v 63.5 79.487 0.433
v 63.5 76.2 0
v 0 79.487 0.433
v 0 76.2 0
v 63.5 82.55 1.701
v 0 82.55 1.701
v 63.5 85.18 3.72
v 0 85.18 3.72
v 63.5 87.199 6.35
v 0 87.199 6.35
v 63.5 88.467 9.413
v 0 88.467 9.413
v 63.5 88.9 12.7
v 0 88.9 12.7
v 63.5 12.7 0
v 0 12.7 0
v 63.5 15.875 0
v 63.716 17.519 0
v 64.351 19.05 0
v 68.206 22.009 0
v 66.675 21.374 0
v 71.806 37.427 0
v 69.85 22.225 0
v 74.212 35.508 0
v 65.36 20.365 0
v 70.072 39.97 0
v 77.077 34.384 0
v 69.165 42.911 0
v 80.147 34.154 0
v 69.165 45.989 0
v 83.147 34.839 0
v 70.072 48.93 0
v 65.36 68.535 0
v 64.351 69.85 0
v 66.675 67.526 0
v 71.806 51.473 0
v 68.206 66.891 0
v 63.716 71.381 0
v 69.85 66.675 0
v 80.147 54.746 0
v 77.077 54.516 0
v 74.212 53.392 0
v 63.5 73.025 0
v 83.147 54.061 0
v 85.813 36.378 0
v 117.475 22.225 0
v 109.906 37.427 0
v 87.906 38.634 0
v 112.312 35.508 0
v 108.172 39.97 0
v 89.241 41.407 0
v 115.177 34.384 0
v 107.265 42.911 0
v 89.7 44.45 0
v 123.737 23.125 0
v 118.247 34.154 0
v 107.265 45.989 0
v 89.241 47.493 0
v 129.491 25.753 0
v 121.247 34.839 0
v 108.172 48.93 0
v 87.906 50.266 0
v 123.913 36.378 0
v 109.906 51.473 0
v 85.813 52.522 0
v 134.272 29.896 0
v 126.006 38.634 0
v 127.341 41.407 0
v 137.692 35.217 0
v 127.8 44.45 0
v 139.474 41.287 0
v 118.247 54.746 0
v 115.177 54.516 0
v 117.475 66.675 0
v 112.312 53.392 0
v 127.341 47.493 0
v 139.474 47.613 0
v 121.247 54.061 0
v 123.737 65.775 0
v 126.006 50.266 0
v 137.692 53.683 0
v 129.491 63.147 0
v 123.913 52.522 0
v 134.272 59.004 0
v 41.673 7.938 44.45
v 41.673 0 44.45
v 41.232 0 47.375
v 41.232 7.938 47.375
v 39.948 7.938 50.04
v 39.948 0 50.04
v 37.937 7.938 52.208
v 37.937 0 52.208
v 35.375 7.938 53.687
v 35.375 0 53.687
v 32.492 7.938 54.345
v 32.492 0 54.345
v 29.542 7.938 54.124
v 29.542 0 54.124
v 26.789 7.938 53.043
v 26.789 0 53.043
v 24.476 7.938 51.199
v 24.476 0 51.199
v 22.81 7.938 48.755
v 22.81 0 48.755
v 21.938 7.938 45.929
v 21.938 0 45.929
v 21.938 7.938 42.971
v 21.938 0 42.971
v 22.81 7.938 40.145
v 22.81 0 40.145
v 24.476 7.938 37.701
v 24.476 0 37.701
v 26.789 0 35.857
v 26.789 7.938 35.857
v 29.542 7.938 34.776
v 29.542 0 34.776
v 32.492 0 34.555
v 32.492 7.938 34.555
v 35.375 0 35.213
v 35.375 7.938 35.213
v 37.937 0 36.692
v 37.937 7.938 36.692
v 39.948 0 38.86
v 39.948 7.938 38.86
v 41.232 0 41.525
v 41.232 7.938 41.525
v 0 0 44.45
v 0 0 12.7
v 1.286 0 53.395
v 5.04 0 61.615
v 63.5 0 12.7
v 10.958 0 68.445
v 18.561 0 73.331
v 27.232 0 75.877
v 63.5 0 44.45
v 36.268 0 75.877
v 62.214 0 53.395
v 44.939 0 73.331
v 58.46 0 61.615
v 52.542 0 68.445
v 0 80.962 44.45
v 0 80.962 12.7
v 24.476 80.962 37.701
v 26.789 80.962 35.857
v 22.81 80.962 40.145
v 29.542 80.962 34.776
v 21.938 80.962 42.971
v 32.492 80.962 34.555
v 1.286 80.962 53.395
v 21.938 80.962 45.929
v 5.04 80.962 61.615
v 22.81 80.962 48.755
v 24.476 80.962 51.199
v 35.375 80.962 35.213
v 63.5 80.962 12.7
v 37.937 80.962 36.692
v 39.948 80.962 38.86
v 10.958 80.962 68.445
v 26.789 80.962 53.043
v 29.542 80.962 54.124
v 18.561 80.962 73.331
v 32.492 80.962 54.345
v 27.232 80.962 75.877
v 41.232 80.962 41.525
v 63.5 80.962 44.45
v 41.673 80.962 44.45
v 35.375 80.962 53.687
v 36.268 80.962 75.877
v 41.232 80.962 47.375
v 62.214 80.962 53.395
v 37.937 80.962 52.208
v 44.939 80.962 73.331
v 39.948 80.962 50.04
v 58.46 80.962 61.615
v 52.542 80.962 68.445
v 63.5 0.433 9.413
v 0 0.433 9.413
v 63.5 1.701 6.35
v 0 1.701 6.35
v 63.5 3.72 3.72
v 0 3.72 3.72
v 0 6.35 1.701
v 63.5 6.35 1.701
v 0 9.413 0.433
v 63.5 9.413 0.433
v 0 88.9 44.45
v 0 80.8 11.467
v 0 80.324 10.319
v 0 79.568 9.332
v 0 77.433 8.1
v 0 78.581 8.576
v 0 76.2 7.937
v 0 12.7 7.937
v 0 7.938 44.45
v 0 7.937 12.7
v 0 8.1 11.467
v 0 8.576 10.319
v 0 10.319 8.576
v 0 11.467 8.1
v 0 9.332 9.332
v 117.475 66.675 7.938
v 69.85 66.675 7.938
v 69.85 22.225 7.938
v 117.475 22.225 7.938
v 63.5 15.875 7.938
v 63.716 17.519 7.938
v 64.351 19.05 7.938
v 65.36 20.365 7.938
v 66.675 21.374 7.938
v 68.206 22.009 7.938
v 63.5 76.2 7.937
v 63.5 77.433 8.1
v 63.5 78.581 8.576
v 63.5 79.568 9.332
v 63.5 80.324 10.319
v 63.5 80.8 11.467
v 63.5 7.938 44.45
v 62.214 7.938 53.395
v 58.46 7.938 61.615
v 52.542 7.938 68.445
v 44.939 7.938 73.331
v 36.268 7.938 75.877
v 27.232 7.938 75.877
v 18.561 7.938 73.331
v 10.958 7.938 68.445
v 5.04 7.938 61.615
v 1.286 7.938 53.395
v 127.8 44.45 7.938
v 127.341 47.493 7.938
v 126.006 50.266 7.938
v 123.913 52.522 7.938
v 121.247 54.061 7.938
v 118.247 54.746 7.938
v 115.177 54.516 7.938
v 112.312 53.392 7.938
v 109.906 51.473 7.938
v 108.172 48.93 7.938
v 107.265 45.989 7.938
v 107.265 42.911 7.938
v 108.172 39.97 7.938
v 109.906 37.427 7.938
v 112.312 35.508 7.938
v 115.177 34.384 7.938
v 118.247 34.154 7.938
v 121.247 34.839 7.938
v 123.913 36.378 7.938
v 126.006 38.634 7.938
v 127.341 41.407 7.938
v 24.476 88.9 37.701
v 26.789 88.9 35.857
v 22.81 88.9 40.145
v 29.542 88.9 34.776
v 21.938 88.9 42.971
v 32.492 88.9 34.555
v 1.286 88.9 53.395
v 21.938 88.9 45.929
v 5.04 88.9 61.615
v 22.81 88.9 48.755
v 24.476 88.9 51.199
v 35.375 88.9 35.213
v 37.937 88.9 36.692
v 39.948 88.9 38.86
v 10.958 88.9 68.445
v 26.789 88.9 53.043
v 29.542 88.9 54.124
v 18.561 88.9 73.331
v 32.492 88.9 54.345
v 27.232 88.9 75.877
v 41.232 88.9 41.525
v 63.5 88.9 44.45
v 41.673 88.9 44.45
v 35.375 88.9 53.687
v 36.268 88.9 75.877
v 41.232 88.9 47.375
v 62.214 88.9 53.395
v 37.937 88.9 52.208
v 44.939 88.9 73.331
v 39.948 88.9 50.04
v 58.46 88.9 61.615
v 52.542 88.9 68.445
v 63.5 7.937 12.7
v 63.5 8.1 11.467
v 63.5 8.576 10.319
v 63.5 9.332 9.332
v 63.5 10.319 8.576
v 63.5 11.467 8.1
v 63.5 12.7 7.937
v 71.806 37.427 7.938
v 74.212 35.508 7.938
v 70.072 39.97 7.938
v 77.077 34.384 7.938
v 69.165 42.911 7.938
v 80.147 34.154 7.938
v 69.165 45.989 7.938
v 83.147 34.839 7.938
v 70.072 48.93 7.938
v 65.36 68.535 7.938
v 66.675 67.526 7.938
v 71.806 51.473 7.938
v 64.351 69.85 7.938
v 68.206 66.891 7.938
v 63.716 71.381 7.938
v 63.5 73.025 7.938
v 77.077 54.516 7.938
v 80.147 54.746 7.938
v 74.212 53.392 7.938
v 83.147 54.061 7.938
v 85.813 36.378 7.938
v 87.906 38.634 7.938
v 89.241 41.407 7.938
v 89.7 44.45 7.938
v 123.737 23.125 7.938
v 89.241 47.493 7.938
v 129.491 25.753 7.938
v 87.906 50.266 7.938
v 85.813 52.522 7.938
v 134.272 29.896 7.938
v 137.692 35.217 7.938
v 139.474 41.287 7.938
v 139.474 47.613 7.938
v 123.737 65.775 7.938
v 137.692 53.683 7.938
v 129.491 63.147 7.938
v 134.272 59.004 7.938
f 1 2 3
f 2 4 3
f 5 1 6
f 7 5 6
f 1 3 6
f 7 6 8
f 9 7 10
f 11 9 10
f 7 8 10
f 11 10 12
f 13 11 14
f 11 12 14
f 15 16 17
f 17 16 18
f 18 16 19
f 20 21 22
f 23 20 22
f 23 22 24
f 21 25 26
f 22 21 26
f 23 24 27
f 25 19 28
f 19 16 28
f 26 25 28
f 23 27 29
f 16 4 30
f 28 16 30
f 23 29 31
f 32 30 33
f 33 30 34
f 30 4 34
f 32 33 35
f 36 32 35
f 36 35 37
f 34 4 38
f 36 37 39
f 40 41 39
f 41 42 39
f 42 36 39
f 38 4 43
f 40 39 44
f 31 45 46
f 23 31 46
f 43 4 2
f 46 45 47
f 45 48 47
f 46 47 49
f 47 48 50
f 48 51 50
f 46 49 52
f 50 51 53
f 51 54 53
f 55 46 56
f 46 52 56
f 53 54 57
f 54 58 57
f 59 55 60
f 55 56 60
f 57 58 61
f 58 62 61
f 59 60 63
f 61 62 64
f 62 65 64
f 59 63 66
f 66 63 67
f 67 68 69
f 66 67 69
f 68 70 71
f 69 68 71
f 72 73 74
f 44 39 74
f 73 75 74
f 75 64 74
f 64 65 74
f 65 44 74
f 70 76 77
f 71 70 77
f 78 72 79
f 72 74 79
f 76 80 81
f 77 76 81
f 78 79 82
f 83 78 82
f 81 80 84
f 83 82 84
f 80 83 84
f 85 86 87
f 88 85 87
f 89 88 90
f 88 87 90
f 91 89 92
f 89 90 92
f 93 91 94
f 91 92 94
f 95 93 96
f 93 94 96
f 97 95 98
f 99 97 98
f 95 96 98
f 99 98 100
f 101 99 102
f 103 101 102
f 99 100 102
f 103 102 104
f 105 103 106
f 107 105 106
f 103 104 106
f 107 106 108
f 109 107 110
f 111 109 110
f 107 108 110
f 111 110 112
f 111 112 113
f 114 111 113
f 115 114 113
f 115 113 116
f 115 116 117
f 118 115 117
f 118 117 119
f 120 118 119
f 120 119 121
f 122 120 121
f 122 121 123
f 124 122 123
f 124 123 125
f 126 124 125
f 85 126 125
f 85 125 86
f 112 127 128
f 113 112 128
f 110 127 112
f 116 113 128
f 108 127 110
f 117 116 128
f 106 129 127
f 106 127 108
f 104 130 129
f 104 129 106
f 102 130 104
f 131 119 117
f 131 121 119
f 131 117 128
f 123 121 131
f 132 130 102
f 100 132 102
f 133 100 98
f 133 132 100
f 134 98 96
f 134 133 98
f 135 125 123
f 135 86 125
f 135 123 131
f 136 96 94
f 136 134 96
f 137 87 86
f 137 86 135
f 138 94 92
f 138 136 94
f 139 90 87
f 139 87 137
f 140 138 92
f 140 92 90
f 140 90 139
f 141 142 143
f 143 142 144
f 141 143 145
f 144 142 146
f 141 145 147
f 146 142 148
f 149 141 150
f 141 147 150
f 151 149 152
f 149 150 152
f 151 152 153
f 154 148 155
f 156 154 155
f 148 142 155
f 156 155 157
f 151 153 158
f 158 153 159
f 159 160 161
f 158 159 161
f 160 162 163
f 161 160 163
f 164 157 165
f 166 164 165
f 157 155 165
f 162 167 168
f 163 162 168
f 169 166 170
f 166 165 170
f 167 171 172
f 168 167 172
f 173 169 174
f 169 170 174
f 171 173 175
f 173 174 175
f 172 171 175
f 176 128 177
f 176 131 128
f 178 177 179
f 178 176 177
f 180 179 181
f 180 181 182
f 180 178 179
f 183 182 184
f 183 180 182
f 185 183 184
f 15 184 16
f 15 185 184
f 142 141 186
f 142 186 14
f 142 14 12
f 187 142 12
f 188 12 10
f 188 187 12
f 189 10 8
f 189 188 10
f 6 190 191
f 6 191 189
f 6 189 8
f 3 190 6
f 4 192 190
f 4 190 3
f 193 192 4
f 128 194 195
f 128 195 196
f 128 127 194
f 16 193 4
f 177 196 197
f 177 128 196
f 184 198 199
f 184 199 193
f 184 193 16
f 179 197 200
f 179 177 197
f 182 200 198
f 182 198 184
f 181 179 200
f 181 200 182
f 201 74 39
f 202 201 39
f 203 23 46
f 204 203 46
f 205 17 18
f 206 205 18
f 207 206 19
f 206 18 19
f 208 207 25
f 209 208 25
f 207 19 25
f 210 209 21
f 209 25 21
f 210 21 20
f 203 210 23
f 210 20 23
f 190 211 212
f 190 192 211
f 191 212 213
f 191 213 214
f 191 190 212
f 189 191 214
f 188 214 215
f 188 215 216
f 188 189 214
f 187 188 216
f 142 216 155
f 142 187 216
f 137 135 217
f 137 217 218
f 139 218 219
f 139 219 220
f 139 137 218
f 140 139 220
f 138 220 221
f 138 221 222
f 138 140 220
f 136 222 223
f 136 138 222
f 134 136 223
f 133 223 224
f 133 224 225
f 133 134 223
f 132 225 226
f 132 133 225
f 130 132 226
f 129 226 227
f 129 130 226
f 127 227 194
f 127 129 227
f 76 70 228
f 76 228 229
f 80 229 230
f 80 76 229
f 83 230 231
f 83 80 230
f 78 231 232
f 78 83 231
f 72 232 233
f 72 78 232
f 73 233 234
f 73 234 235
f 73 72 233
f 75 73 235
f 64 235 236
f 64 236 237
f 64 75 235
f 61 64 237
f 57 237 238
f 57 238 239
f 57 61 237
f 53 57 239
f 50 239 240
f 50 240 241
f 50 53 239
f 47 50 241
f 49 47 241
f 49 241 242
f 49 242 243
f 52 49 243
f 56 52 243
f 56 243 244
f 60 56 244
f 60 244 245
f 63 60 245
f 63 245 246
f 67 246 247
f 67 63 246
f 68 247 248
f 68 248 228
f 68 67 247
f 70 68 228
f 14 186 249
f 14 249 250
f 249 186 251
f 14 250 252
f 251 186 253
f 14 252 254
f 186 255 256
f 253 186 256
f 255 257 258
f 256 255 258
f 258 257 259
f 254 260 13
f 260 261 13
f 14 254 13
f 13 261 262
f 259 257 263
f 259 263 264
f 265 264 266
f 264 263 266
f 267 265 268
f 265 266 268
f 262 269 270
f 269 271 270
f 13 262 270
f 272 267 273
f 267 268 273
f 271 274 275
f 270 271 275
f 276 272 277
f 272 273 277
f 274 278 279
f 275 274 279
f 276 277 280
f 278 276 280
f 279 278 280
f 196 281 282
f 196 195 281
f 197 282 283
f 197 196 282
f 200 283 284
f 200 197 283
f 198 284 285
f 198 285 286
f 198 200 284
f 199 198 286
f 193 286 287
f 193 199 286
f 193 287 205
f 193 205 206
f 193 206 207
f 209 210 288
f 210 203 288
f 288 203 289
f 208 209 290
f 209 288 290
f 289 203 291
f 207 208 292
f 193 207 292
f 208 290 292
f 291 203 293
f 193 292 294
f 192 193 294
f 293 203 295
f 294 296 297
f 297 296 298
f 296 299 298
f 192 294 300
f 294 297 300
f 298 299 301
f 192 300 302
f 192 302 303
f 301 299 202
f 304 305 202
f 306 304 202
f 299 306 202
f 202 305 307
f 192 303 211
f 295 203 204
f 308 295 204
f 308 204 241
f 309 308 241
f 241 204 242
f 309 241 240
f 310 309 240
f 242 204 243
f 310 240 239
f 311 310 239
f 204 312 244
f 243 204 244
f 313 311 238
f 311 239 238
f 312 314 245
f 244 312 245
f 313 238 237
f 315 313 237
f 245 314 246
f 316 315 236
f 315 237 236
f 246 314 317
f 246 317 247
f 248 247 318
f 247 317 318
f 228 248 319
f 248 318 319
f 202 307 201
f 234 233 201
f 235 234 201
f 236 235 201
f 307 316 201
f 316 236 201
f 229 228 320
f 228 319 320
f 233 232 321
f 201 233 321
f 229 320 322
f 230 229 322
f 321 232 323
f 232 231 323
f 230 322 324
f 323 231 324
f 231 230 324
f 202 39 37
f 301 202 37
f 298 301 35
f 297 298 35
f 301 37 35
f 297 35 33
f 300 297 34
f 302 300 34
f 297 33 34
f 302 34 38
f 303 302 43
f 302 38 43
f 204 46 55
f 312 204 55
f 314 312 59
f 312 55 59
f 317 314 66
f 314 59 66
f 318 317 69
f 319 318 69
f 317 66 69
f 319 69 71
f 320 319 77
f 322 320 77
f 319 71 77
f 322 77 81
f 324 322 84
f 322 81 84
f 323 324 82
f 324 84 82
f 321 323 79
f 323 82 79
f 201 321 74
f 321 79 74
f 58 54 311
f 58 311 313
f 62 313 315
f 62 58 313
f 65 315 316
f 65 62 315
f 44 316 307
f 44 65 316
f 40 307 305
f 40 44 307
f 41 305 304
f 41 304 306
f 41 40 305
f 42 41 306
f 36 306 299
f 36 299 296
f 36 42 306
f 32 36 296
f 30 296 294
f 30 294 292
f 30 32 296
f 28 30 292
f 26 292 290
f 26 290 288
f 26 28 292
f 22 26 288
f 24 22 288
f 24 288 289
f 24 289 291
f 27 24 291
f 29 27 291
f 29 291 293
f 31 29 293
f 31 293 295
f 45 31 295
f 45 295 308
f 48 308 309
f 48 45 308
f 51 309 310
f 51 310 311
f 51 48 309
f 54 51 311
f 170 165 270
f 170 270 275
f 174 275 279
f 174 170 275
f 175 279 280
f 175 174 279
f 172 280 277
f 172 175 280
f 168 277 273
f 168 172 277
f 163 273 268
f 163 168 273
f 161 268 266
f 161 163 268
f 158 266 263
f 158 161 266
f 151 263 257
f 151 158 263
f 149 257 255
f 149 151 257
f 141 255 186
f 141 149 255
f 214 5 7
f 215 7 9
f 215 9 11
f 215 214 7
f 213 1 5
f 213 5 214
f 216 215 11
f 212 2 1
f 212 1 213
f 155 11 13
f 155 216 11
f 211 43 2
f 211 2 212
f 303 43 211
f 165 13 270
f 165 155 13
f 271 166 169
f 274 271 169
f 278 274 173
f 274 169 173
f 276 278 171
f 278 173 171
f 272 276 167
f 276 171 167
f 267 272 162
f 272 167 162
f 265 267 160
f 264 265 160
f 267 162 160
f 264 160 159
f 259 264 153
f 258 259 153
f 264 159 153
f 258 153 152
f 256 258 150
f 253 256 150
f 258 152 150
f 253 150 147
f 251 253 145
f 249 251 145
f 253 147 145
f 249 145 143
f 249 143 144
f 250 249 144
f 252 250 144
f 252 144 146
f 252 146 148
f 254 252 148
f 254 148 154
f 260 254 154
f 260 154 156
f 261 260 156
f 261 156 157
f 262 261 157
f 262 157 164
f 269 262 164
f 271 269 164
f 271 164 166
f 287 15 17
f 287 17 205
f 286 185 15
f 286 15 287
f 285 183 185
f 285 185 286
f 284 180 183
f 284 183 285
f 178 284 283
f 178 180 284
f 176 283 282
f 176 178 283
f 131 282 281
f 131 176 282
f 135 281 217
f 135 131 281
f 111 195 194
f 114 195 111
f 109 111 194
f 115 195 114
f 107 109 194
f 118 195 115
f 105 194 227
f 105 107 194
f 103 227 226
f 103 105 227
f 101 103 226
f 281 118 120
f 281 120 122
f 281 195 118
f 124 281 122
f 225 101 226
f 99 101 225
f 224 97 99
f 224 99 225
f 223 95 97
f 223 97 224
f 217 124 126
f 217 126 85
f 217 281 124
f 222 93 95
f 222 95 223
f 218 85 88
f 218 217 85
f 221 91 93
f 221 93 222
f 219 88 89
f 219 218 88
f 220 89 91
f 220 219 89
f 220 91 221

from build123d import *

# Parameters (mm, degrees)
F0_R     = 10.3251
F2_DEPTH = 7.9375
F1_R     = 9.92251
F3_DEPTH = 88.9
F4_W     = 73.025
F4_H     = 76.2
F5_DEPTH = 63.501
F6_R     = 12.7
F7_R     = 4.7625


with BuildPart() as f2:
    # F0 (on Top) → F2 (new body)
    with BuildSketch(Plane.XY):
        with BuildLine():
            Line((0, 88.9), (0, 0))
            Line((0, 0), (63.5, 0))
            Line((63.5, 0), (63.5, 15.875))
            ThreePointArc((63.5, 15.875), (65.359872, 20.365128), (69.85, 22.225))
            Line((69.85, 22.225), (117.475, 22.225))
            ThreePointArc((117.475, 22.225), (139.7, 44.45), (117.475, 66.675))
            Line((117.475, 66.675), (69.85, 66.675))
            ThreePointArc((69.85, 66.675), (65.359872, 68.534872), (63.5, 73.025))
            Line((63.5, 73.025), (63.5, 88.9))
            Line((63.5, 88.9), (0, 88.9))
        make_face()
        with Locations((79.375, 44.45)):
            Circle(F0_R, mode=Mode.SUBTRACT)
        with Locations((117.475, 44.45)):
            Circle(F0_R, mode=Mode.SUBTRACT)
    extrude(amount=F2_DEPTH)

    # F1 (on Front) → F3 (join)
    with BuildSketch(Plane.XZ):
        with BuildLine():
            Line((0, 44.45), (0, 0))
            Line((0, 0), (63.5, 0))
            Line((63.5, 0), (63.5, 44.45))
            ThreePointArc((63.5, 44.45), (31.75, 76.2), (0, 44.45))
        make_face()
        with Locations((31.75, 44.45)):
            Circle(F1_R, mode=Mode.SUBTRACT)
    extrude(amount=-F3_DEPTH)

    # F4 (on face) → F5 (cut, through all)
    with BuildSketch(Plane.YZ.offset(63.5)):
        with Locations((44.45, 46.0375)):
            Rectangle(F4_W, F4_H)
    extrude(amount=-F5_DEPTH, mode=Mode.SUBTRACT)

    # F6
    f6_edges = [f2.edges().sort_by_distance(p)[0] for p in [
        (31.75, 0, 0),
        (31.75, 88.9, 0),
    ]]
    fillet(f6_edges, radius=F6_R)

    # F7
    f7_edges = [f2.edges().sort_by_distance(p)[0] for p in [
        (31.75, 7.9375, 7.9375),
        (31.75, 80.9625, 7.9375),
    ]]
    fillet(f7_edges, radius=F7_R)


solid = f2.part
